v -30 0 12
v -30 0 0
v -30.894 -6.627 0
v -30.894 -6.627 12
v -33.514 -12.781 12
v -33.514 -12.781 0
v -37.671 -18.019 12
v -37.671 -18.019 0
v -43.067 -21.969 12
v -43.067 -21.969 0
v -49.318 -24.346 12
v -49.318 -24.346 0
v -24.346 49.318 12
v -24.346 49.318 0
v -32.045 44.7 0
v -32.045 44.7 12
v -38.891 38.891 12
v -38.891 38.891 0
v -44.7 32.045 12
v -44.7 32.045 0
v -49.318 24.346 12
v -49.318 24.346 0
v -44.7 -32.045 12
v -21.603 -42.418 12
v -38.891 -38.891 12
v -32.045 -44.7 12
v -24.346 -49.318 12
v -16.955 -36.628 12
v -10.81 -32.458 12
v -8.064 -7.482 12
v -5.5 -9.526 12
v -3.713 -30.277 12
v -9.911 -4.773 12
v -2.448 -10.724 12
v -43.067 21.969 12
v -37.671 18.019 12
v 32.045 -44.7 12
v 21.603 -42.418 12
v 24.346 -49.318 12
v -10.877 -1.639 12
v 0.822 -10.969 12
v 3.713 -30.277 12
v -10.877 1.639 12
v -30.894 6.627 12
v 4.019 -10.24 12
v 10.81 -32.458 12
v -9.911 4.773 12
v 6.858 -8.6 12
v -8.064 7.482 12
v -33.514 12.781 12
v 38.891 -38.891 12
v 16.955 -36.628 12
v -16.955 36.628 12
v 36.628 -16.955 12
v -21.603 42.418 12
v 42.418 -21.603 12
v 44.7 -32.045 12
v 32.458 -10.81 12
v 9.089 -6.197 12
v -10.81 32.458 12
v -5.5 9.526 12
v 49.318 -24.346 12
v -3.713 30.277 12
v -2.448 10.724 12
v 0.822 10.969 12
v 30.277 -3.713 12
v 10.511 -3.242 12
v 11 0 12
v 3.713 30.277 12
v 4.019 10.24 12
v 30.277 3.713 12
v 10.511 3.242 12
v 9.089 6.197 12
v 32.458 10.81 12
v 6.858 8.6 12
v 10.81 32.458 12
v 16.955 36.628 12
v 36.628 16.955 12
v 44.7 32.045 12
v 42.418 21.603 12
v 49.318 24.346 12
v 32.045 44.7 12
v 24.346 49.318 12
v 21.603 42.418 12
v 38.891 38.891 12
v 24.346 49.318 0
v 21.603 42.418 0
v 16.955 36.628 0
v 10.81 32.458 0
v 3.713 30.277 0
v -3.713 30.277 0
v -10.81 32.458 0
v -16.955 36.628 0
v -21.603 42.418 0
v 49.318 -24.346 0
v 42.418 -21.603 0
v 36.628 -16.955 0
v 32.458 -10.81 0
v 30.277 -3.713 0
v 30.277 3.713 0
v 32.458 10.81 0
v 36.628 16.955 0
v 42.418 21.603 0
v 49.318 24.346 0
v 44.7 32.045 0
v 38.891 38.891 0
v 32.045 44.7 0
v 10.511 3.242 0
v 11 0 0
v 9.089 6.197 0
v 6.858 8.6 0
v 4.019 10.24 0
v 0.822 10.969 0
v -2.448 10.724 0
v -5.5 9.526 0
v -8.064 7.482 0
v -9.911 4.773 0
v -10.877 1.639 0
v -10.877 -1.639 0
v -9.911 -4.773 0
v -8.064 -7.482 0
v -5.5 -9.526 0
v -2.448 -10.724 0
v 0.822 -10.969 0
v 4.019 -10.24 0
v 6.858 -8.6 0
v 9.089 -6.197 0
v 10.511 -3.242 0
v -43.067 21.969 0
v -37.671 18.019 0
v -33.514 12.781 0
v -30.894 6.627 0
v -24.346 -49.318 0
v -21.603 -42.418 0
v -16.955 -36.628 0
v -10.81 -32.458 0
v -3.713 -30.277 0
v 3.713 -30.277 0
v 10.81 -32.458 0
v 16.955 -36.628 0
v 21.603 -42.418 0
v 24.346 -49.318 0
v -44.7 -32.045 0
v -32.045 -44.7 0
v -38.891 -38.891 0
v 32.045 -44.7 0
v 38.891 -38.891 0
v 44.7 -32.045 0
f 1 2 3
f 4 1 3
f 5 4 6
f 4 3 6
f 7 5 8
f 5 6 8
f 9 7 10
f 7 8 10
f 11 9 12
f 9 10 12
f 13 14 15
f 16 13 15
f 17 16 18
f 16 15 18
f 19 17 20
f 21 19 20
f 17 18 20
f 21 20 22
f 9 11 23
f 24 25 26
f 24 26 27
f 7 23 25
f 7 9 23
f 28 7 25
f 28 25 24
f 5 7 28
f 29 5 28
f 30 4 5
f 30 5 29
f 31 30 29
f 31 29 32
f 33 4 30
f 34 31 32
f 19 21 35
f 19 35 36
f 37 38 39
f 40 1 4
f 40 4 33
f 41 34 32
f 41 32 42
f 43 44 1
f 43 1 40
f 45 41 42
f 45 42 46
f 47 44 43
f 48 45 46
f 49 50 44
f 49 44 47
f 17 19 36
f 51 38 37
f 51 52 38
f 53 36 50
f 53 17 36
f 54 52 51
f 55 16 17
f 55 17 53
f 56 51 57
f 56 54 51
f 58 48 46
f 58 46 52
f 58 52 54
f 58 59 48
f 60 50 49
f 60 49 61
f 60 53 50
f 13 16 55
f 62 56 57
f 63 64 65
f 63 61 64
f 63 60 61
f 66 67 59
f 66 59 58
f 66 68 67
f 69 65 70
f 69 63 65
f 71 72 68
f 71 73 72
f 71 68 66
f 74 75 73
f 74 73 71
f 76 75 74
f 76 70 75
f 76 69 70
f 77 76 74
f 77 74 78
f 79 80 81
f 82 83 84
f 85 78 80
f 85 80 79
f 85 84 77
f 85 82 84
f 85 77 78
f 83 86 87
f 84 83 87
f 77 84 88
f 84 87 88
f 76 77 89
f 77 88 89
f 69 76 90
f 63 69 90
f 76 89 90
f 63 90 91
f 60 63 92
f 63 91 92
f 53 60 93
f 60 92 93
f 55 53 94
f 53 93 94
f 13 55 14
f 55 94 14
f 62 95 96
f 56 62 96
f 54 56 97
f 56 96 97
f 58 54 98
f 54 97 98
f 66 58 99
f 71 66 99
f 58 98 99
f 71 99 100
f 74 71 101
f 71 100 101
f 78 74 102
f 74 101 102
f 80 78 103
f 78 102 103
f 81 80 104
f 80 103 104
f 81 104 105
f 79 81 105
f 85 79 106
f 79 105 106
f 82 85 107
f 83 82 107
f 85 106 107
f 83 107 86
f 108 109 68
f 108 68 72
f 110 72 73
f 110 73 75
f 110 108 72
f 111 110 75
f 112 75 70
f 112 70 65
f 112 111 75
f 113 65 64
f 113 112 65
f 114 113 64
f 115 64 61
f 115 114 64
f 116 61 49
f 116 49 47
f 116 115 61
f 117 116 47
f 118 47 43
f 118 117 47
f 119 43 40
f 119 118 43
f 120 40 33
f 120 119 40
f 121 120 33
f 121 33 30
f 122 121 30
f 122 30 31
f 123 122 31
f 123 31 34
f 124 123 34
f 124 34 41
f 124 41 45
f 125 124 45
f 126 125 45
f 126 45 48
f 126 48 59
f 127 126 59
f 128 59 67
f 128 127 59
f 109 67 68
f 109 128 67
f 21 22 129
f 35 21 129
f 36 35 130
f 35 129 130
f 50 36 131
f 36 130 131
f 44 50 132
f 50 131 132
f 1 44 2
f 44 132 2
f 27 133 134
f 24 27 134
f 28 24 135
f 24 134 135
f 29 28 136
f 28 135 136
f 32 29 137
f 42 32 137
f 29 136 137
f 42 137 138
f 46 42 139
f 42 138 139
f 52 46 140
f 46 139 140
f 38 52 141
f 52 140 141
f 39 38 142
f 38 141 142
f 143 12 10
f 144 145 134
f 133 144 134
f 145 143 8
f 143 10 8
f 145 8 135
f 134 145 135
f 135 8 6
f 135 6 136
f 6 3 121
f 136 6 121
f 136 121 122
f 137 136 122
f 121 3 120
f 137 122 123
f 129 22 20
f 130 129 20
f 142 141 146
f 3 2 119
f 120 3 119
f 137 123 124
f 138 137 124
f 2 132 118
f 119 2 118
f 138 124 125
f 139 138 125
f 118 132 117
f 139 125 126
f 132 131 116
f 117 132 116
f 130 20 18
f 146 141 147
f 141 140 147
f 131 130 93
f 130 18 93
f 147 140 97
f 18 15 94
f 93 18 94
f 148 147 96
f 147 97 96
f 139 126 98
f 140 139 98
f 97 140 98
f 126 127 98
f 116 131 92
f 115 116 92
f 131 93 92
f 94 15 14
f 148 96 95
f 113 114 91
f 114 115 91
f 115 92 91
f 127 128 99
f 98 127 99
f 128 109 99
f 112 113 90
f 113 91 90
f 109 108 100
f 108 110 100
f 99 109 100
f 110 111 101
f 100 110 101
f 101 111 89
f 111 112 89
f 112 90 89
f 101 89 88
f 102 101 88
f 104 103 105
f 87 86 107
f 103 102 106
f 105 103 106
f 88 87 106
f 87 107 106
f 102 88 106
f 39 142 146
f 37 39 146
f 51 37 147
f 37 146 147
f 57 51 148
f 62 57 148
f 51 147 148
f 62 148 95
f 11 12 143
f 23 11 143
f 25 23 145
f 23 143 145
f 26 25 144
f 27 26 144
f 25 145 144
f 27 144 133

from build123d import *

# Parameters (mm, degrees)
F0_R     = 11
F1_DEPTH = 12


with BuildPart() as f1:
    # F0 (on Top) → F1 (new body)
    with BuildSketch(Plane.XY):
        with BuildLine():
            ThreePointArc((49.318182, -24.345779), (30, 0), (49.318182, 24.345779))
            ThreePointArc((49.318182, 24.345779), (38.890873, 38.890873), (24.345779, 49.318182))
            ThreePointArc((24.345779, 49.318182), (0, 30), (-24.345779, 49.318182))
            ThreePointArc((-24.345779, 49.318182), (-38.890873, 38.890873), (-49.318182, 24.345779))
            ThreePointArc((-49.318182, 24.345779), (-35.416264, 15.539539), (-30, 0))
            ThreePointArc((-30, 0), (-35.416264, -15.539539), (-49.318182, -24.345779))
            ThreePointArc((-49.318182, -24.345779), (-38.890873, -38.890873), (-24.345779, -49.318182))
            ThreePointArc((-24.345779, -49.318182), (0, -30), (24.345779, -49.318182))
            ThreePointArc((24.345779, -49.318182), (38.890873, -38.890873), (49.318182, -24.345779))
        make_face()
        Circle(F0_R, mode=Mode.SUBTRACT)
    extrude(amount=F1_DEPTH)


solid = f1.part
